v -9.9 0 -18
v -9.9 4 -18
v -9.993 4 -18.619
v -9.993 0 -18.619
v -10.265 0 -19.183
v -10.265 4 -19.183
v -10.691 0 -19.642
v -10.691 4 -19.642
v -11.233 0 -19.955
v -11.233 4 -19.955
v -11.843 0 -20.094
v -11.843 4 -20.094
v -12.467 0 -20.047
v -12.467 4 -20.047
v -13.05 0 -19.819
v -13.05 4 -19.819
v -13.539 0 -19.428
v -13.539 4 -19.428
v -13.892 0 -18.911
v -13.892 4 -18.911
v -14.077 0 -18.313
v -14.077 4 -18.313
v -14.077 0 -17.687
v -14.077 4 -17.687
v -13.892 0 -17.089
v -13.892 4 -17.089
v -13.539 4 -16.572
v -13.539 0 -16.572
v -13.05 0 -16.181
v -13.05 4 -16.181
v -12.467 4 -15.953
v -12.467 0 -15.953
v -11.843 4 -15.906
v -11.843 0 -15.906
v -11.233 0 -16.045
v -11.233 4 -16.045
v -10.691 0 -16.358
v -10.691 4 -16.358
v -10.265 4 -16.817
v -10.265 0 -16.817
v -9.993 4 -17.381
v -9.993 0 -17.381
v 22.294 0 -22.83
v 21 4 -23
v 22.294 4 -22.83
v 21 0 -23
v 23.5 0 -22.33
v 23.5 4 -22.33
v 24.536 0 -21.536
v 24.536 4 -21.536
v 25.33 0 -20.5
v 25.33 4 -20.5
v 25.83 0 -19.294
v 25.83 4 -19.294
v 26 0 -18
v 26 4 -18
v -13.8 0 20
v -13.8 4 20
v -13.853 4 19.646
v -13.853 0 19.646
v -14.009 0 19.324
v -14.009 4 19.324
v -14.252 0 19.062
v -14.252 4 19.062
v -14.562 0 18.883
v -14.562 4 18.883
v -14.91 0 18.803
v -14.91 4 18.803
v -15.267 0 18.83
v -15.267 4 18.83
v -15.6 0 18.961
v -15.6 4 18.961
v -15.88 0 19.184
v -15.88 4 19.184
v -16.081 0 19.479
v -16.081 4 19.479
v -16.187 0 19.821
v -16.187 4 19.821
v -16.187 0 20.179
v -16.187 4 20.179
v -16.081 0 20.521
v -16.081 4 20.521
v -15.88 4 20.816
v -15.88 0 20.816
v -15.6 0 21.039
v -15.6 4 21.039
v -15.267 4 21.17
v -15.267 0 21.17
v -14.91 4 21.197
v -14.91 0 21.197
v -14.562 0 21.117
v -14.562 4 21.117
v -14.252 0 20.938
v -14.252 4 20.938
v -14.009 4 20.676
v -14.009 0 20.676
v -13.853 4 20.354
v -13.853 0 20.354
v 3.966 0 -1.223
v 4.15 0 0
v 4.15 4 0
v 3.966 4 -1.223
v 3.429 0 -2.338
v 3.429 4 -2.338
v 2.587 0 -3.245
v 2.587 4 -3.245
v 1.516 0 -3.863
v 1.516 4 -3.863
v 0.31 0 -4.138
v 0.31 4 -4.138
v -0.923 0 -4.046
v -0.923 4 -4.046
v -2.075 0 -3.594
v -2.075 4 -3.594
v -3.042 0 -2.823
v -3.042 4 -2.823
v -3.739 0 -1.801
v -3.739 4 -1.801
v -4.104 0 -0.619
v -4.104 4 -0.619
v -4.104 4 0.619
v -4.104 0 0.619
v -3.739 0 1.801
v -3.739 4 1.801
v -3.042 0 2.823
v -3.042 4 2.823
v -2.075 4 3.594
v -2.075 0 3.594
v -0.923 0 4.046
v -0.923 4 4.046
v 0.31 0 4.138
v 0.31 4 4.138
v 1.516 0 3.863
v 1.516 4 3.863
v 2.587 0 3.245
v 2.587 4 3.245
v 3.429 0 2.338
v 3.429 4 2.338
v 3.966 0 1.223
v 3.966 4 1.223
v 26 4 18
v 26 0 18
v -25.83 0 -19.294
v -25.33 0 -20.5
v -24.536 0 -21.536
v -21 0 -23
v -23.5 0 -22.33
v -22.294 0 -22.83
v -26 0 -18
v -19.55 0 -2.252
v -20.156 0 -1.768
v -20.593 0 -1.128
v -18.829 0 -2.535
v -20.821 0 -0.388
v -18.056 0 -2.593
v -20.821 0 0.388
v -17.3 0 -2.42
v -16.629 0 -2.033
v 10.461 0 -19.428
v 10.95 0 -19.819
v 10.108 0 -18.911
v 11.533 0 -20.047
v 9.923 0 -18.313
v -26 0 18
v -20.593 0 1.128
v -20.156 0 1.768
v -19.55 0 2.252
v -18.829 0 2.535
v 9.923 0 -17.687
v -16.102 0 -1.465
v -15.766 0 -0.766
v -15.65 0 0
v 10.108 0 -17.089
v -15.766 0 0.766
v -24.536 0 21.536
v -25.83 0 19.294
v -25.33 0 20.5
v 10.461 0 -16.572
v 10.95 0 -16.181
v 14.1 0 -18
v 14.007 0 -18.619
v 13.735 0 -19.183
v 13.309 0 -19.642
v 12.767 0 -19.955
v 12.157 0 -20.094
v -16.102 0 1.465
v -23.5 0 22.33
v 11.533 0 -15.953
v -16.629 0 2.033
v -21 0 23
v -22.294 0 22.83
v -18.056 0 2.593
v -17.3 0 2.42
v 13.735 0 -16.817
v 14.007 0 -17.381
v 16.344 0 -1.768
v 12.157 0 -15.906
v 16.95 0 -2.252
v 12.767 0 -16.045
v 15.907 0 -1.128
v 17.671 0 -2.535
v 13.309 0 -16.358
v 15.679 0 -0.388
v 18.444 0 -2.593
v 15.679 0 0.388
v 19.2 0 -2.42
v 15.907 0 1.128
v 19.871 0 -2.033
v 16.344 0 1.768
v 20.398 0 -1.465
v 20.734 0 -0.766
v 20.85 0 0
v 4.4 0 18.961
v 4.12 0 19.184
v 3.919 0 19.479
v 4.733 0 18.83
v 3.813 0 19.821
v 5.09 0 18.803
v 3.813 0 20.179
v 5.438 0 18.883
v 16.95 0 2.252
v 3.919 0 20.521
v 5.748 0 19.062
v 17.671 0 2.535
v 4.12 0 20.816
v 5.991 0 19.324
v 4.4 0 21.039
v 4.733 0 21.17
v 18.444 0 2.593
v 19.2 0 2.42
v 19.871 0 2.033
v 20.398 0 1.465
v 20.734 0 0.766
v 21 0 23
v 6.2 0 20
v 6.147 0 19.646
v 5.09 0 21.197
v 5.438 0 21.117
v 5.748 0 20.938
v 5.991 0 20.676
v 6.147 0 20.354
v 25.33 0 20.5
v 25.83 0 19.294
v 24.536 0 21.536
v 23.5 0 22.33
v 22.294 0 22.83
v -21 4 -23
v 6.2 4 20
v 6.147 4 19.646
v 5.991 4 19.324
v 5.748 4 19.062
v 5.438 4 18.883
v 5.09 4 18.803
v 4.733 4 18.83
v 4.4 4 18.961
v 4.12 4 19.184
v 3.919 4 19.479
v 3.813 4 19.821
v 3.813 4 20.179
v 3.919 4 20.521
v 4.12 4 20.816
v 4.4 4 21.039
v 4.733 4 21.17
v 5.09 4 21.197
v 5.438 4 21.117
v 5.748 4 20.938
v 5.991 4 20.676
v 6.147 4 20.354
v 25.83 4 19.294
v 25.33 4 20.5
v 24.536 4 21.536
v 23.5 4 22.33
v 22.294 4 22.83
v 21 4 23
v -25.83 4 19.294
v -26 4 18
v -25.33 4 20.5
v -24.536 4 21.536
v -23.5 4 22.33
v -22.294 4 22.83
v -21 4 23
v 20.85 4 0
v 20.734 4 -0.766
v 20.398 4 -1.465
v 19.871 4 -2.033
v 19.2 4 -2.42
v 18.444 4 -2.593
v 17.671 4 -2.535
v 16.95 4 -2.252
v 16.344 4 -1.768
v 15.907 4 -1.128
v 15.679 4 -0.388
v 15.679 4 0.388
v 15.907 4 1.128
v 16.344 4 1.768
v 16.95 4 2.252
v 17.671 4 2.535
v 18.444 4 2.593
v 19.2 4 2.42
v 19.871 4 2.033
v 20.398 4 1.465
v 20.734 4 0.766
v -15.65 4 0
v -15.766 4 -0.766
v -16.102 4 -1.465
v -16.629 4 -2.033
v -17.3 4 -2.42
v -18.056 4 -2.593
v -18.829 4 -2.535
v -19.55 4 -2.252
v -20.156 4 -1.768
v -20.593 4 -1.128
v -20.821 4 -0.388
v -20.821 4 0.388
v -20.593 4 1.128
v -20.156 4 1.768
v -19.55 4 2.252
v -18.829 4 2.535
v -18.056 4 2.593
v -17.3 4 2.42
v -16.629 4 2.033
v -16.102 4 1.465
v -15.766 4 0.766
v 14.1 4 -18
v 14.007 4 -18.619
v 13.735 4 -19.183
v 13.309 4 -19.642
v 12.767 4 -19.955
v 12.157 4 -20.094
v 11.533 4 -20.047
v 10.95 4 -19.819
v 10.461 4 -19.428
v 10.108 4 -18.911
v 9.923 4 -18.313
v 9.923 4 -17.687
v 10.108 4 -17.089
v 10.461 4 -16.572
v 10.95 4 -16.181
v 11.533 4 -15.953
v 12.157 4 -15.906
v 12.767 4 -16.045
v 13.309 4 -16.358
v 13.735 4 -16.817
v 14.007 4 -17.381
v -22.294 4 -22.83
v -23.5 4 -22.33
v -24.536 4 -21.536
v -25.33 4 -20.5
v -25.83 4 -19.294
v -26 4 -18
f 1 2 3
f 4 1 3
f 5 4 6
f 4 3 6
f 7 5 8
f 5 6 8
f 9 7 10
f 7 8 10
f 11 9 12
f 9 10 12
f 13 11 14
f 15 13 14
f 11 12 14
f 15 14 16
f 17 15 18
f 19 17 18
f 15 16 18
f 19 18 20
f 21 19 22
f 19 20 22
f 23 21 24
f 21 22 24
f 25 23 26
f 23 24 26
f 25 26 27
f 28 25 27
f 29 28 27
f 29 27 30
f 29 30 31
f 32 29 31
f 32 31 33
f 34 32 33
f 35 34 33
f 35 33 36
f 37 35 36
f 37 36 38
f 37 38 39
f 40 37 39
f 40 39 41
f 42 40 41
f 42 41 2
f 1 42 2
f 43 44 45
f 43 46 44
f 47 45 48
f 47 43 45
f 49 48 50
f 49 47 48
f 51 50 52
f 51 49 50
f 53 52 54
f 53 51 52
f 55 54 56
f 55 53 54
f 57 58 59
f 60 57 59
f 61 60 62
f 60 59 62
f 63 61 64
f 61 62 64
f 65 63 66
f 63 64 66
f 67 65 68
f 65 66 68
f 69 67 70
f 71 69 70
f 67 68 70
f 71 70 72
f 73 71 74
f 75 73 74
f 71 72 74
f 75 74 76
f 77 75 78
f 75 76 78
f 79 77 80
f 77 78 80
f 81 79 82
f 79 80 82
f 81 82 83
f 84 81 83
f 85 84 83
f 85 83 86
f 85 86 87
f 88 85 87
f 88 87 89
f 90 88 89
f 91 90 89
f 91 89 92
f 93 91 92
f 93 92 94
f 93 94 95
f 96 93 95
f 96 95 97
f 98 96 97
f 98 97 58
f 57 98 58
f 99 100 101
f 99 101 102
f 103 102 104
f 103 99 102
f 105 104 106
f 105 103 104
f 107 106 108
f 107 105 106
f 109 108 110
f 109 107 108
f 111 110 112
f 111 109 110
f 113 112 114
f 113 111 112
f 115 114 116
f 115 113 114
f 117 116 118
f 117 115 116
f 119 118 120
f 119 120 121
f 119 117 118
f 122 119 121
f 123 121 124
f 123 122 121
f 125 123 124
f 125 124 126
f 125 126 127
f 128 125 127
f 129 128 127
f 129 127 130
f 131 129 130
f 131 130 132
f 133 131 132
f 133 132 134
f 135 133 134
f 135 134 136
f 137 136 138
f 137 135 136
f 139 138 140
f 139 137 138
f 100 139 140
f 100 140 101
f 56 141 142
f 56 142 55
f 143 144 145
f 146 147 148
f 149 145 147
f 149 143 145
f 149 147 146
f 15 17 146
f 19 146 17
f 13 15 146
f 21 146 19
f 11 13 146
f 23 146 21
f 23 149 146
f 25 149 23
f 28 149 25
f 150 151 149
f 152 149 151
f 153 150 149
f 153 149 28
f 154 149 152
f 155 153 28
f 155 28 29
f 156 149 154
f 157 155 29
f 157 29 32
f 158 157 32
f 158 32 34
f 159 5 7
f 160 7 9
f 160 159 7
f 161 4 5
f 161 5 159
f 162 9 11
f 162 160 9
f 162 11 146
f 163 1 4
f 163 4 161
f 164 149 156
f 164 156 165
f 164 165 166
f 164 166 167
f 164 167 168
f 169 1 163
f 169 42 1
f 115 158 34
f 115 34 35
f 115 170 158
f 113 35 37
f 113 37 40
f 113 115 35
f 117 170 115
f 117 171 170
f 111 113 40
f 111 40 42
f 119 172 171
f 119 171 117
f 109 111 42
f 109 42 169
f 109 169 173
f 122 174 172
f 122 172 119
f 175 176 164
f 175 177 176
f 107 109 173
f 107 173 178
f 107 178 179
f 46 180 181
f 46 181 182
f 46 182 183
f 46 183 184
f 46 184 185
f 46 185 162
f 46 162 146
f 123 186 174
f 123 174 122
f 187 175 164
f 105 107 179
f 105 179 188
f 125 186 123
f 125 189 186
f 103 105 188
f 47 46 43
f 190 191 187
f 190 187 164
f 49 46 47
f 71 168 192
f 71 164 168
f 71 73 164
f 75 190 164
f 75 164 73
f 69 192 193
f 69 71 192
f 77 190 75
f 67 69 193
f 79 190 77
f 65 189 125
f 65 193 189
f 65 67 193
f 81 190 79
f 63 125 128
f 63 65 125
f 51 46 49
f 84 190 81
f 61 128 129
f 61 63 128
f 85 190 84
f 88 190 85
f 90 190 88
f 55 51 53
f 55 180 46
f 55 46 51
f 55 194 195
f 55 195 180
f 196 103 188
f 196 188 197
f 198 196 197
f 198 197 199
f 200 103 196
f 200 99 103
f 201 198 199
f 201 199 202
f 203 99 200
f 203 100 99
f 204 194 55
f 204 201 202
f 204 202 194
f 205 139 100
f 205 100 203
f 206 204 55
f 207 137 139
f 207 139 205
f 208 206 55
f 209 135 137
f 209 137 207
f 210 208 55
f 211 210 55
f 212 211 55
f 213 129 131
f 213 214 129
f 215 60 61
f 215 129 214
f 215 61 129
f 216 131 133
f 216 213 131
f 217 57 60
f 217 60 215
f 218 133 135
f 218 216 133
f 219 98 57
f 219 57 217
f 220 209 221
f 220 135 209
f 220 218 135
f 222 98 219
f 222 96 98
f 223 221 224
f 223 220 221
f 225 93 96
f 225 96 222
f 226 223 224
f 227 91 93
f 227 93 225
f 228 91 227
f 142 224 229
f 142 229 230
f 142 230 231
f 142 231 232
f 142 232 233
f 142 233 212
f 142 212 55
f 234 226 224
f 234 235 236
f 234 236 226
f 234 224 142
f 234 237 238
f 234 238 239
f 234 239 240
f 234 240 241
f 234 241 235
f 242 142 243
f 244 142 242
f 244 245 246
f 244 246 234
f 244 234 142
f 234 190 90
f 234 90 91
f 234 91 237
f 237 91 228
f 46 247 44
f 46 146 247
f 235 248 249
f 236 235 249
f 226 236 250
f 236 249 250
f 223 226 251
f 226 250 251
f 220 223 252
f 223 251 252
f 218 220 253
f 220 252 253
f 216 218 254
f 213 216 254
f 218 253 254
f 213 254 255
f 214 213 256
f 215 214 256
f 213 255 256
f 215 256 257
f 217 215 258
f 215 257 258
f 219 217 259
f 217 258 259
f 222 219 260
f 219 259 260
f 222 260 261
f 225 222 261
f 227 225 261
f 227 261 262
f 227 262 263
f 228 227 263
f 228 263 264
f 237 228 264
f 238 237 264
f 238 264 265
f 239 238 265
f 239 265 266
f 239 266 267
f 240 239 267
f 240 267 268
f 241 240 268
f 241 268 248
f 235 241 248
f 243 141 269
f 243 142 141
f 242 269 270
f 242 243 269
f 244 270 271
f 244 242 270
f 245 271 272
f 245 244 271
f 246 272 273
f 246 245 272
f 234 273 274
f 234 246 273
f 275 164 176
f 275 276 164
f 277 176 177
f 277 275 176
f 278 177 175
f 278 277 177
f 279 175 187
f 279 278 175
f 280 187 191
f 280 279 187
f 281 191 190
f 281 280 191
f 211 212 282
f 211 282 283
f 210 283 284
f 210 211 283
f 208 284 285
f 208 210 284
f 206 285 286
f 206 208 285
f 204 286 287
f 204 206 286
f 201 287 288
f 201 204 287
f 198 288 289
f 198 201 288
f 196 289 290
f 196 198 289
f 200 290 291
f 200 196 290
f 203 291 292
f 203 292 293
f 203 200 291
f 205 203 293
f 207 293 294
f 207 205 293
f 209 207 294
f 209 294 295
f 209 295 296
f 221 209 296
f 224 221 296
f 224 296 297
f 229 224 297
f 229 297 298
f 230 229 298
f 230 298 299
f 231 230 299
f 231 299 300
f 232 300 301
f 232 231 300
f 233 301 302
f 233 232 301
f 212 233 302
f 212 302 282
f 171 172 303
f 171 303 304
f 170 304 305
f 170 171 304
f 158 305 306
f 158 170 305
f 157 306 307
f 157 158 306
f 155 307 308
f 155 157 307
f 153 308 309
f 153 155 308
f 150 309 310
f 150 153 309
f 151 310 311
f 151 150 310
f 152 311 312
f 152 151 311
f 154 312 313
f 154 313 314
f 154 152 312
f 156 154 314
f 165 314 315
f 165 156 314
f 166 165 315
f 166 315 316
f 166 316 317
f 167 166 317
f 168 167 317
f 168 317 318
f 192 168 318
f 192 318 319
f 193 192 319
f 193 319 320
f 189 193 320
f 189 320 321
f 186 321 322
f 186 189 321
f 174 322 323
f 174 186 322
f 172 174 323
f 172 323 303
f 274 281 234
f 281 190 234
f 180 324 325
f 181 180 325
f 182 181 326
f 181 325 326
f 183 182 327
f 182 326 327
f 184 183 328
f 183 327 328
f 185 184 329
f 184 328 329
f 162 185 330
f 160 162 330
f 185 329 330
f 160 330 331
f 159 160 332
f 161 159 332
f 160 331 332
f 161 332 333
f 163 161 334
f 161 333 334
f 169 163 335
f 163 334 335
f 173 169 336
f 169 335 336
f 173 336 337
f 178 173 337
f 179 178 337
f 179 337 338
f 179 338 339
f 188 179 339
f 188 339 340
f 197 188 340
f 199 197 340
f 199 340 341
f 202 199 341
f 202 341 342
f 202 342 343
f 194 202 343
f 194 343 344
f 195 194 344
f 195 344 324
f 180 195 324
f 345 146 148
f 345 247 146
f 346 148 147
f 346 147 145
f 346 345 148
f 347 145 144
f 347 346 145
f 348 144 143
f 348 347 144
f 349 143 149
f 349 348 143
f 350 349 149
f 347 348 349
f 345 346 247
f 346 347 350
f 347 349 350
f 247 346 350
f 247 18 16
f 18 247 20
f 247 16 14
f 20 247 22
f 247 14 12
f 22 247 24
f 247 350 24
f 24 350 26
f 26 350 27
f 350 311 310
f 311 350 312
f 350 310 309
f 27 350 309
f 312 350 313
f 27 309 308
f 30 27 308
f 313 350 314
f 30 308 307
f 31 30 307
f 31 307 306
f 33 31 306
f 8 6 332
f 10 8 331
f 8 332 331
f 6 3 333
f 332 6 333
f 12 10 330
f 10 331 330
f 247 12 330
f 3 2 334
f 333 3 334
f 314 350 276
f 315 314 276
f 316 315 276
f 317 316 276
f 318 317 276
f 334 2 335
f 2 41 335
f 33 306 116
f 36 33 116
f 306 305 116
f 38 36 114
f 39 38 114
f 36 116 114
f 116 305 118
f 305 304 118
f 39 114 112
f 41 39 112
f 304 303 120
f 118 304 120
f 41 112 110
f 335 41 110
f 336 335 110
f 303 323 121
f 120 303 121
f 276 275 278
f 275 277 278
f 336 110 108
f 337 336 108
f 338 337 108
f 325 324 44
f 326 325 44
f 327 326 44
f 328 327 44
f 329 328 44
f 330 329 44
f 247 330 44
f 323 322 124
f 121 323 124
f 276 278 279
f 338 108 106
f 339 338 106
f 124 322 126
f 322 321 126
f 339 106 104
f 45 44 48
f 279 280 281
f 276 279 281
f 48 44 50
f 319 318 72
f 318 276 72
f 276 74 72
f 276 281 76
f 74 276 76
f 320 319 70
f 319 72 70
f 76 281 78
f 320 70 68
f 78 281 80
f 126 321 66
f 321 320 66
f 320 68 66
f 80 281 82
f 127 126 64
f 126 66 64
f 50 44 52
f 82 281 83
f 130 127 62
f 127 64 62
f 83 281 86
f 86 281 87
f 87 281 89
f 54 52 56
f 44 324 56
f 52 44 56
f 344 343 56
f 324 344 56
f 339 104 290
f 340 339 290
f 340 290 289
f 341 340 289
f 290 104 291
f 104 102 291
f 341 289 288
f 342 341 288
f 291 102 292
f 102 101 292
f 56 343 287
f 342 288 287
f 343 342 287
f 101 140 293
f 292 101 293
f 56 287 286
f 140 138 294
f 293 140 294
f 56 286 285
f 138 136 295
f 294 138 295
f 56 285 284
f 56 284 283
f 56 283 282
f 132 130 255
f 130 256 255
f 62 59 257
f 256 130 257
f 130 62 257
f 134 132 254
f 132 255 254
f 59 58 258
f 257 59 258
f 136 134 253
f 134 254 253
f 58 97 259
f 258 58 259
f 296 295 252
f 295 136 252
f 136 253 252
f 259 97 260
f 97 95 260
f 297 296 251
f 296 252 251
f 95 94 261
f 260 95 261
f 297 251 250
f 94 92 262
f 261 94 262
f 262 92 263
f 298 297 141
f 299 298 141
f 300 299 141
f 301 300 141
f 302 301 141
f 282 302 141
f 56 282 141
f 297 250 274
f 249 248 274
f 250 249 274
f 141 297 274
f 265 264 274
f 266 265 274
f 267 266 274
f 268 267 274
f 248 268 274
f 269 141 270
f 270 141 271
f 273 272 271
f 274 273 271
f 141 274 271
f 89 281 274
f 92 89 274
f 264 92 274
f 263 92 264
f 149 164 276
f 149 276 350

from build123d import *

# Parameters (mm, degrees)
SKETCH_1_W            = 52
SKETCH_1_H            = 46
SKETCH_1_R            = 2.6
SKETCH_1_R_2          = 4.15
EXTRUDE_436_DEPTH     = 4
SKETCH_4_R            = 2.1
CUT_EXTRUDE_686_DEPTH = 5
SKETCH_6_R            = 2.1
EXTRUDE_1_DEPTH       = 4
SKETCH_7_R            = 1.2
CUT_EXTRUDE_1_DEPTH   = 5
SKETCH_8_W            = 29.384652785
SKETCH_8_H            = 46
EXTRUDE_2_DEPTH       = 4
SKETCH_9_W            = 29.384652785
SKETCH_9_H            = 46
CUT_EXTRUDE_2_DEPTH   = 5
FILLET_1_R            = 5


with BuildPart() as part:
    # 草图1 → Extrude 436 (new body)
    with BuildSketch(Plane(origin=(0, 0, 0), x_dir=(1, 0, 0), z_dir=(0, 1, 0))):
        Rectangle(SKETCH_1_W, SKETCH_1_H)
        with Locations((-18.25, 0)):
            Circle(SKETCH_1_R, mode=Mode.SUBTRACT)
        with Locations((18.25, 0)):
            Circle(SKETCH_1_R, mode=Mode.SUBTRACT)
        Circle(SKETCH_1_R_2, mode=Mode.SUBTRACT)
    extrude(amount=EXTRUDE_436_DEPTH)

    # 草图4 → Cut-Extrude 686 (cut, through all)
    with BuildSketch(Plane(origin=(0, 4, 0), x_dir=(1, 0, 0), z_dir=(0, 1, 0))):
        with Locations((-12, 18)):
            Circle(SKETCH_4_R)
        with Locations((12, 18)):
            Circle(SKETCH_4_R)
        with Locations((12, -18)):
            Circle(SKETCH_4_R)
        with Locations((-12, -18)):
            Circle(SKETCH_4_R)
    extrude(amount=-CUT_EXTRUDE_686_DEPTH, mode=Mode.SUBTRACT)

    # 草图6 → 凸台-拉伸1 (add)
    with BuildSketch(Plane(origin=(0, 4, 0), x_dir=(1, 0, 0), z_dir=(0, 1, 0))):
        with Locations((-12, -18)):
            Circle(SKETCH_6_R)
        with Locations((12, -18)):
            Circle(SKETCH_6_R)
    extrude(amount=-EXTRUDE_1_DEPTH)

    # 草图7 → 切除-拉伸1 (cut, through all)
    with BuildSketch(Plane(origin=(0, 4, 0), x_dir=(1, 0, 0), z_dir=(0, 1, 0))):
        with Locations((5, -20)):
            Circle(SKETCH_7_R)
        with Locations((-15, -20)):
            Circle(SKETCH_7_R)
    extrude(amount=-CUT_EXTRUDE_1_DEPTH, mode=Mode.SUBTRACT)

    # 草图8 → 凸台-拉伸2 (add)
    with BuildSketch(Plane.XZ):
        with Locations((40.692326393, 0)):
            Rectangle(SKETCH_8_W, SKETCH_8_H)
    extrude(amount=-EXTRUDE_2_DEPTH)

    # 草图9 → 切除-拉伸2 (cut, through all)
    with BuildSketch(Plane(origin=(0, 4, 0), x_dir=(1, 0, 0), z_dir=(0, 1, 0))):
        with Locations((40.692326393, 0)):
            Rectangle(SKETCH_9_W, SKETCH_9_H)
    extrude(amount=-CUT_EXTRUDE_2_DEPTH, mode=Mode.SUBTRACT)

    # 圆角1
    fillet_1_edges = [part.edges().sort_by_distance(p)[0] for p in [
        (-26, 2, 23),
        (-26, 2, -23),
        (26, 2, 23),
        (26, 2, -23),
    ]]
    fillet(fillet_1_edges, radius=FILLET_1_R)


solid = part.part
